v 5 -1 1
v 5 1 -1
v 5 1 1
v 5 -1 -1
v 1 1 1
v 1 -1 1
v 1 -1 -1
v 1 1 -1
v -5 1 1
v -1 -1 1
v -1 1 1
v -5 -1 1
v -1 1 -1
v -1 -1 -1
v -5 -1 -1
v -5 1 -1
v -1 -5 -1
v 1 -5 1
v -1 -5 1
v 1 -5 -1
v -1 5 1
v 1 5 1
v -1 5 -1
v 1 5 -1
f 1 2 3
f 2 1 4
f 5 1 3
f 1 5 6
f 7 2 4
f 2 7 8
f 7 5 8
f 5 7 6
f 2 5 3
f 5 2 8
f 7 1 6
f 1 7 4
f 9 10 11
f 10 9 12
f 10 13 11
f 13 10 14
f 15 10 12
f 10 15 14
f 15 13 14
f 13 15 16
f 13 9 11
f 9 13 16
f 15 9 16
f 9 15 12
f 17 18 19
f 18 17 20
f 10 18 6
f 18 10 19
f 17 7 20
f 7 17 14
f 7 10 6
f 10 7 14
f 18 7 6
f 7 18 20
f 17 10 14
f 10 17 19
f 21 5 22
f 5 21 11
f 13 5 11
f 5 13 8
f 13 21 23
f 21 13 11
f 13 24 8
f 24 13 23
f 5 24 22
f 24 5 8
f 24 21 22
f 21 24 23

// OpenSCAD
// ///////////////////////////////////////////////////////
// // utilities
// module copy_mirror(vec=[0,1,0]) 
// { 
//     children(); 
//     mirror(vec) children(); 
// } 

// function other_side(s1, s2) = sqrt(s1 * s1 + s2 * s2);

// //
// // Simple and fast corned cube!
// // Anaximandro de Godinho.
// //

// module cube_cylinder_rounded(size, center=false, corner_roundness_factor) {
//   // intersection() {
//   //   cube(size = [attachment_square_width, attachment_square_width, just_bottom_catcher_thickness + attachment_square_height], center=true);
//   //   cylinder(r = (corner_to_corner_attachment_square_distance/2) - corner_roundness_factor, h=just_bottom_catcher_thickness + attachment_square_height, $fn=200, center=true);
//   // }

//   corner_to_corner_distance = other_side(size[0], size[1]);

//   intersection() {
//     cube(size = size, center=center);
//     cylinder(r = (corner_to_corner_distance/2) - corner_roundness_factor, h=size[2], $fn=200, center=center);
//   }
// }

// module cubeX( size, radius=1, rounded=true, center=false )
// {
//   l = len( size );
//   if( l == undef )
//     _cubeX( size, size, size, radius, rounded, center );
//   else
//     _cubeX( size[0], size[1], size[2], radius, rounded, center );
// }

// module _cubeX( x, y, z, r, rounded, center )
// {
//   if( rounded )
//     if( center )
//       translate( [-x/2, -y/2, -z/2] )
//       __cubeX( x, y, z, r );
//     else
//       __cubeX( x, y, z, r );
//   else
//     cube( [x, y, z], center );
// }

// module __cubeX( x, y, z, r )
// {
//   //TODO: discount r.
//   rC = r;
//   hull()
//   {
//     translate( [rC, rC, rC] )
//       sphere( r );
//     translate( [rC, y-rC, rC] )
//       sphere( r );
//     translate( [rC, rC, z-rC] )
//       sphere( r );
//     translate( [rC, y-rC, z-rC] )
//       sphere( r );

//     translate( [x-rC, rC, rC] )
//       sphere( r );
//     translate( [x-rC, y-rC, rC] )
//       sphere( r );
//     translate( [x-rC, rC, z-rC] )
//       sphere( r );
//     translate( [x-rC, y-rC, z-rC] )
//       sphere( r );
//   }
// }

// ///////////////////////////////////////////////////////
// // design
// module holder_box(phone_length, phone_width, phone_height, catcher_thickness, top_catcher_overlap,
//                   side_thickness, side_gap_height, side_gap_width, side_gap_top_distance,
//                   corner_roundness_factor = 1) {


//   // aka hypotenuse
//   corner_to_corner_distance = other_side(phone_length, phone_width);

//   // the box
//   difference() {
//     cubeX(size = [phone_length + side_thickness, phone_width + side_thickness, phone_height + catcher_thickness], center = true);
//     cubeX(size = [phone_length, phone_width, phone_height], center = true);

//     // cut out the chunk along the length
//     cubeX(size = [phone_length - top_catcher_overlap, phone_width, phone_height + catcher_thickness + 2], center = true);
//     // cut out the chunk along the width
//     cubeX(size = [phone_length, phone_width - top_catcher_overlap, phone_height + catcher_thickness + 2], center = true);

//     // cut out a gap 
//     translate([-phone_length / 2 + 20, 0, -side_gap_top_distance]) {
//       cube(size = [side_gap_width, phone_width + side_thickness + 2, side_gap_height ], center = true);
//     }
//   }
// }

// module zip_tie_tunnel(width, length, height) {
//   cube(size = [width, length, height], center=true);
// }

// module width_support(bottom_support_width, phone_width, side_thickness, just_bottom_catcher_thickness) {
//   cubeX(size = [bottom_support_width, phone_width + side_thickness, just_bottom_catcher_thickness], center = true);
// }

// module bottom_supports(phone_length, phone_width, phone_height, side_thickness, catcher_thickness, bottom_support_width,
//                        attachment_square_width,
//                        attachment_square_height,
//                        ziptie_height,
//                        ziptie_width,
//                        corner_roundness_factor = 4) {
//   just_bottom_catcher_thickness = catcher_thickness / 2;

//   translate_to_top = phone_height * 1/2 + just_bottom_catcher_thickness * 1/2;

//   union() {
//     // center cross
//     translate([0, 0, translate_to_top]) {
//       // wall to wall section
//       width_support(bottom_support_width, phone_width, side_thickness, just_bottom_catcher_thickness);

//       // bottom attachment square
//       difference() {
//         translate([0, 0, attachment_square_height/2]) {
//           cube_cylinder_rounded(size = [attachment_square_width, attachment_square_width, just_bottom_catcher_thickness + attachment_square_height],
//                                 center = true,
//                                 corner_roundness_factor = corner_roundness_factor);
//         }

//         // 4 zip tie tunnels
//         copy_mirror([1, 1, 0]) {
//           copy_mirror([1, 0, 0]) {
//             translate([attachment_square_width * 1/4, 0, attachment_square_height * 3/4]) {
//               zip_tie_tunnel(ziptie_width, attachment_square_width + 4, ziptie_height);
//             }
//           }
//         }
//       }

//       // the cross-bar
//       rotate([0, 0, 90]) {
//         cubeX(size = [bottom_support_width, 2 * phone_length / 3 + bottom_support_width, just_bottom_catcher_thickness], center = true);
//       }
//     }

//     translate([phone_length * -1/3, 0, translate_to_top]) {
//       width_support(bottom_support_width, phone_width, side_thickness, just_bottom_catcher_thickness);
//     }

//     translate([phone_length * 1/3, 0, translate_to_top]) {
//       width_support(bottom_support_width, phone_width, side_thickness, just_bottom_catcher_thickness);
//     }
//   }
// }

// phone_length = 143.5;
// phone_width = 73.3;
// phone_height = 11.2;

// side_thickness = 6;

// catcher_thickness = 5;
// top_catcher_overlap = 20;


// side_gap_top_distance = 4;
// catcher_thickness = side_thickness;

// side_gap_height = 2;
// side_gap_width = 50;

// bottom_support_count = 3;
// bottom_support_width = 10;

// attachment_square_width = 30;
// attachment_square_height = 20;

// ziptie_height = 2;
// ziptie_width = 5;

// intersection() {
//   union() {
//     holder_box(phone_length,
//                phone_width,
//                phone_height,
//                catcher_thickness,
//                top_catcher_overlap,
//                side_thickness,
//                side_gap_height,
//                side_gap_width,
//                side_gap_top_distance
//     );
//     bottom_supports(phone_length, phone_width, phone_height, side_thickness, catcher_thickness, bottom_support_width,
//                     attachment_square_width,
//                     attachment_square_height,
//                     ziptie_height,
//                     ziptie_width);
//   }

//   // Printer's too small, cut the model in half
//   translate([phone_length/2, 0, 0]) {
//     cube(size = [phone_length, 1000, 1000], center=true);    
//   }
// }

module copy_mirror(vec=[0,1,0]) 
{ 
    children(); 
    mirror(vec) children(); 
} 

module build_cube() {
  translate([3, 0, 0]) {
    cube(size=[4, 2, 2], center=true);
  }
}

build_cube();
mirror([1, 0, 0]) {
  build_cube();
}
mirror([1, 1, 0]) {
  build_cube();
}
mirror([1, 1, 0]) {
  mirror([1, 0, 0]) {
    build_cube();
  }
}

// mirror([1, 0, 0]) {
//   build_cube();
// }
